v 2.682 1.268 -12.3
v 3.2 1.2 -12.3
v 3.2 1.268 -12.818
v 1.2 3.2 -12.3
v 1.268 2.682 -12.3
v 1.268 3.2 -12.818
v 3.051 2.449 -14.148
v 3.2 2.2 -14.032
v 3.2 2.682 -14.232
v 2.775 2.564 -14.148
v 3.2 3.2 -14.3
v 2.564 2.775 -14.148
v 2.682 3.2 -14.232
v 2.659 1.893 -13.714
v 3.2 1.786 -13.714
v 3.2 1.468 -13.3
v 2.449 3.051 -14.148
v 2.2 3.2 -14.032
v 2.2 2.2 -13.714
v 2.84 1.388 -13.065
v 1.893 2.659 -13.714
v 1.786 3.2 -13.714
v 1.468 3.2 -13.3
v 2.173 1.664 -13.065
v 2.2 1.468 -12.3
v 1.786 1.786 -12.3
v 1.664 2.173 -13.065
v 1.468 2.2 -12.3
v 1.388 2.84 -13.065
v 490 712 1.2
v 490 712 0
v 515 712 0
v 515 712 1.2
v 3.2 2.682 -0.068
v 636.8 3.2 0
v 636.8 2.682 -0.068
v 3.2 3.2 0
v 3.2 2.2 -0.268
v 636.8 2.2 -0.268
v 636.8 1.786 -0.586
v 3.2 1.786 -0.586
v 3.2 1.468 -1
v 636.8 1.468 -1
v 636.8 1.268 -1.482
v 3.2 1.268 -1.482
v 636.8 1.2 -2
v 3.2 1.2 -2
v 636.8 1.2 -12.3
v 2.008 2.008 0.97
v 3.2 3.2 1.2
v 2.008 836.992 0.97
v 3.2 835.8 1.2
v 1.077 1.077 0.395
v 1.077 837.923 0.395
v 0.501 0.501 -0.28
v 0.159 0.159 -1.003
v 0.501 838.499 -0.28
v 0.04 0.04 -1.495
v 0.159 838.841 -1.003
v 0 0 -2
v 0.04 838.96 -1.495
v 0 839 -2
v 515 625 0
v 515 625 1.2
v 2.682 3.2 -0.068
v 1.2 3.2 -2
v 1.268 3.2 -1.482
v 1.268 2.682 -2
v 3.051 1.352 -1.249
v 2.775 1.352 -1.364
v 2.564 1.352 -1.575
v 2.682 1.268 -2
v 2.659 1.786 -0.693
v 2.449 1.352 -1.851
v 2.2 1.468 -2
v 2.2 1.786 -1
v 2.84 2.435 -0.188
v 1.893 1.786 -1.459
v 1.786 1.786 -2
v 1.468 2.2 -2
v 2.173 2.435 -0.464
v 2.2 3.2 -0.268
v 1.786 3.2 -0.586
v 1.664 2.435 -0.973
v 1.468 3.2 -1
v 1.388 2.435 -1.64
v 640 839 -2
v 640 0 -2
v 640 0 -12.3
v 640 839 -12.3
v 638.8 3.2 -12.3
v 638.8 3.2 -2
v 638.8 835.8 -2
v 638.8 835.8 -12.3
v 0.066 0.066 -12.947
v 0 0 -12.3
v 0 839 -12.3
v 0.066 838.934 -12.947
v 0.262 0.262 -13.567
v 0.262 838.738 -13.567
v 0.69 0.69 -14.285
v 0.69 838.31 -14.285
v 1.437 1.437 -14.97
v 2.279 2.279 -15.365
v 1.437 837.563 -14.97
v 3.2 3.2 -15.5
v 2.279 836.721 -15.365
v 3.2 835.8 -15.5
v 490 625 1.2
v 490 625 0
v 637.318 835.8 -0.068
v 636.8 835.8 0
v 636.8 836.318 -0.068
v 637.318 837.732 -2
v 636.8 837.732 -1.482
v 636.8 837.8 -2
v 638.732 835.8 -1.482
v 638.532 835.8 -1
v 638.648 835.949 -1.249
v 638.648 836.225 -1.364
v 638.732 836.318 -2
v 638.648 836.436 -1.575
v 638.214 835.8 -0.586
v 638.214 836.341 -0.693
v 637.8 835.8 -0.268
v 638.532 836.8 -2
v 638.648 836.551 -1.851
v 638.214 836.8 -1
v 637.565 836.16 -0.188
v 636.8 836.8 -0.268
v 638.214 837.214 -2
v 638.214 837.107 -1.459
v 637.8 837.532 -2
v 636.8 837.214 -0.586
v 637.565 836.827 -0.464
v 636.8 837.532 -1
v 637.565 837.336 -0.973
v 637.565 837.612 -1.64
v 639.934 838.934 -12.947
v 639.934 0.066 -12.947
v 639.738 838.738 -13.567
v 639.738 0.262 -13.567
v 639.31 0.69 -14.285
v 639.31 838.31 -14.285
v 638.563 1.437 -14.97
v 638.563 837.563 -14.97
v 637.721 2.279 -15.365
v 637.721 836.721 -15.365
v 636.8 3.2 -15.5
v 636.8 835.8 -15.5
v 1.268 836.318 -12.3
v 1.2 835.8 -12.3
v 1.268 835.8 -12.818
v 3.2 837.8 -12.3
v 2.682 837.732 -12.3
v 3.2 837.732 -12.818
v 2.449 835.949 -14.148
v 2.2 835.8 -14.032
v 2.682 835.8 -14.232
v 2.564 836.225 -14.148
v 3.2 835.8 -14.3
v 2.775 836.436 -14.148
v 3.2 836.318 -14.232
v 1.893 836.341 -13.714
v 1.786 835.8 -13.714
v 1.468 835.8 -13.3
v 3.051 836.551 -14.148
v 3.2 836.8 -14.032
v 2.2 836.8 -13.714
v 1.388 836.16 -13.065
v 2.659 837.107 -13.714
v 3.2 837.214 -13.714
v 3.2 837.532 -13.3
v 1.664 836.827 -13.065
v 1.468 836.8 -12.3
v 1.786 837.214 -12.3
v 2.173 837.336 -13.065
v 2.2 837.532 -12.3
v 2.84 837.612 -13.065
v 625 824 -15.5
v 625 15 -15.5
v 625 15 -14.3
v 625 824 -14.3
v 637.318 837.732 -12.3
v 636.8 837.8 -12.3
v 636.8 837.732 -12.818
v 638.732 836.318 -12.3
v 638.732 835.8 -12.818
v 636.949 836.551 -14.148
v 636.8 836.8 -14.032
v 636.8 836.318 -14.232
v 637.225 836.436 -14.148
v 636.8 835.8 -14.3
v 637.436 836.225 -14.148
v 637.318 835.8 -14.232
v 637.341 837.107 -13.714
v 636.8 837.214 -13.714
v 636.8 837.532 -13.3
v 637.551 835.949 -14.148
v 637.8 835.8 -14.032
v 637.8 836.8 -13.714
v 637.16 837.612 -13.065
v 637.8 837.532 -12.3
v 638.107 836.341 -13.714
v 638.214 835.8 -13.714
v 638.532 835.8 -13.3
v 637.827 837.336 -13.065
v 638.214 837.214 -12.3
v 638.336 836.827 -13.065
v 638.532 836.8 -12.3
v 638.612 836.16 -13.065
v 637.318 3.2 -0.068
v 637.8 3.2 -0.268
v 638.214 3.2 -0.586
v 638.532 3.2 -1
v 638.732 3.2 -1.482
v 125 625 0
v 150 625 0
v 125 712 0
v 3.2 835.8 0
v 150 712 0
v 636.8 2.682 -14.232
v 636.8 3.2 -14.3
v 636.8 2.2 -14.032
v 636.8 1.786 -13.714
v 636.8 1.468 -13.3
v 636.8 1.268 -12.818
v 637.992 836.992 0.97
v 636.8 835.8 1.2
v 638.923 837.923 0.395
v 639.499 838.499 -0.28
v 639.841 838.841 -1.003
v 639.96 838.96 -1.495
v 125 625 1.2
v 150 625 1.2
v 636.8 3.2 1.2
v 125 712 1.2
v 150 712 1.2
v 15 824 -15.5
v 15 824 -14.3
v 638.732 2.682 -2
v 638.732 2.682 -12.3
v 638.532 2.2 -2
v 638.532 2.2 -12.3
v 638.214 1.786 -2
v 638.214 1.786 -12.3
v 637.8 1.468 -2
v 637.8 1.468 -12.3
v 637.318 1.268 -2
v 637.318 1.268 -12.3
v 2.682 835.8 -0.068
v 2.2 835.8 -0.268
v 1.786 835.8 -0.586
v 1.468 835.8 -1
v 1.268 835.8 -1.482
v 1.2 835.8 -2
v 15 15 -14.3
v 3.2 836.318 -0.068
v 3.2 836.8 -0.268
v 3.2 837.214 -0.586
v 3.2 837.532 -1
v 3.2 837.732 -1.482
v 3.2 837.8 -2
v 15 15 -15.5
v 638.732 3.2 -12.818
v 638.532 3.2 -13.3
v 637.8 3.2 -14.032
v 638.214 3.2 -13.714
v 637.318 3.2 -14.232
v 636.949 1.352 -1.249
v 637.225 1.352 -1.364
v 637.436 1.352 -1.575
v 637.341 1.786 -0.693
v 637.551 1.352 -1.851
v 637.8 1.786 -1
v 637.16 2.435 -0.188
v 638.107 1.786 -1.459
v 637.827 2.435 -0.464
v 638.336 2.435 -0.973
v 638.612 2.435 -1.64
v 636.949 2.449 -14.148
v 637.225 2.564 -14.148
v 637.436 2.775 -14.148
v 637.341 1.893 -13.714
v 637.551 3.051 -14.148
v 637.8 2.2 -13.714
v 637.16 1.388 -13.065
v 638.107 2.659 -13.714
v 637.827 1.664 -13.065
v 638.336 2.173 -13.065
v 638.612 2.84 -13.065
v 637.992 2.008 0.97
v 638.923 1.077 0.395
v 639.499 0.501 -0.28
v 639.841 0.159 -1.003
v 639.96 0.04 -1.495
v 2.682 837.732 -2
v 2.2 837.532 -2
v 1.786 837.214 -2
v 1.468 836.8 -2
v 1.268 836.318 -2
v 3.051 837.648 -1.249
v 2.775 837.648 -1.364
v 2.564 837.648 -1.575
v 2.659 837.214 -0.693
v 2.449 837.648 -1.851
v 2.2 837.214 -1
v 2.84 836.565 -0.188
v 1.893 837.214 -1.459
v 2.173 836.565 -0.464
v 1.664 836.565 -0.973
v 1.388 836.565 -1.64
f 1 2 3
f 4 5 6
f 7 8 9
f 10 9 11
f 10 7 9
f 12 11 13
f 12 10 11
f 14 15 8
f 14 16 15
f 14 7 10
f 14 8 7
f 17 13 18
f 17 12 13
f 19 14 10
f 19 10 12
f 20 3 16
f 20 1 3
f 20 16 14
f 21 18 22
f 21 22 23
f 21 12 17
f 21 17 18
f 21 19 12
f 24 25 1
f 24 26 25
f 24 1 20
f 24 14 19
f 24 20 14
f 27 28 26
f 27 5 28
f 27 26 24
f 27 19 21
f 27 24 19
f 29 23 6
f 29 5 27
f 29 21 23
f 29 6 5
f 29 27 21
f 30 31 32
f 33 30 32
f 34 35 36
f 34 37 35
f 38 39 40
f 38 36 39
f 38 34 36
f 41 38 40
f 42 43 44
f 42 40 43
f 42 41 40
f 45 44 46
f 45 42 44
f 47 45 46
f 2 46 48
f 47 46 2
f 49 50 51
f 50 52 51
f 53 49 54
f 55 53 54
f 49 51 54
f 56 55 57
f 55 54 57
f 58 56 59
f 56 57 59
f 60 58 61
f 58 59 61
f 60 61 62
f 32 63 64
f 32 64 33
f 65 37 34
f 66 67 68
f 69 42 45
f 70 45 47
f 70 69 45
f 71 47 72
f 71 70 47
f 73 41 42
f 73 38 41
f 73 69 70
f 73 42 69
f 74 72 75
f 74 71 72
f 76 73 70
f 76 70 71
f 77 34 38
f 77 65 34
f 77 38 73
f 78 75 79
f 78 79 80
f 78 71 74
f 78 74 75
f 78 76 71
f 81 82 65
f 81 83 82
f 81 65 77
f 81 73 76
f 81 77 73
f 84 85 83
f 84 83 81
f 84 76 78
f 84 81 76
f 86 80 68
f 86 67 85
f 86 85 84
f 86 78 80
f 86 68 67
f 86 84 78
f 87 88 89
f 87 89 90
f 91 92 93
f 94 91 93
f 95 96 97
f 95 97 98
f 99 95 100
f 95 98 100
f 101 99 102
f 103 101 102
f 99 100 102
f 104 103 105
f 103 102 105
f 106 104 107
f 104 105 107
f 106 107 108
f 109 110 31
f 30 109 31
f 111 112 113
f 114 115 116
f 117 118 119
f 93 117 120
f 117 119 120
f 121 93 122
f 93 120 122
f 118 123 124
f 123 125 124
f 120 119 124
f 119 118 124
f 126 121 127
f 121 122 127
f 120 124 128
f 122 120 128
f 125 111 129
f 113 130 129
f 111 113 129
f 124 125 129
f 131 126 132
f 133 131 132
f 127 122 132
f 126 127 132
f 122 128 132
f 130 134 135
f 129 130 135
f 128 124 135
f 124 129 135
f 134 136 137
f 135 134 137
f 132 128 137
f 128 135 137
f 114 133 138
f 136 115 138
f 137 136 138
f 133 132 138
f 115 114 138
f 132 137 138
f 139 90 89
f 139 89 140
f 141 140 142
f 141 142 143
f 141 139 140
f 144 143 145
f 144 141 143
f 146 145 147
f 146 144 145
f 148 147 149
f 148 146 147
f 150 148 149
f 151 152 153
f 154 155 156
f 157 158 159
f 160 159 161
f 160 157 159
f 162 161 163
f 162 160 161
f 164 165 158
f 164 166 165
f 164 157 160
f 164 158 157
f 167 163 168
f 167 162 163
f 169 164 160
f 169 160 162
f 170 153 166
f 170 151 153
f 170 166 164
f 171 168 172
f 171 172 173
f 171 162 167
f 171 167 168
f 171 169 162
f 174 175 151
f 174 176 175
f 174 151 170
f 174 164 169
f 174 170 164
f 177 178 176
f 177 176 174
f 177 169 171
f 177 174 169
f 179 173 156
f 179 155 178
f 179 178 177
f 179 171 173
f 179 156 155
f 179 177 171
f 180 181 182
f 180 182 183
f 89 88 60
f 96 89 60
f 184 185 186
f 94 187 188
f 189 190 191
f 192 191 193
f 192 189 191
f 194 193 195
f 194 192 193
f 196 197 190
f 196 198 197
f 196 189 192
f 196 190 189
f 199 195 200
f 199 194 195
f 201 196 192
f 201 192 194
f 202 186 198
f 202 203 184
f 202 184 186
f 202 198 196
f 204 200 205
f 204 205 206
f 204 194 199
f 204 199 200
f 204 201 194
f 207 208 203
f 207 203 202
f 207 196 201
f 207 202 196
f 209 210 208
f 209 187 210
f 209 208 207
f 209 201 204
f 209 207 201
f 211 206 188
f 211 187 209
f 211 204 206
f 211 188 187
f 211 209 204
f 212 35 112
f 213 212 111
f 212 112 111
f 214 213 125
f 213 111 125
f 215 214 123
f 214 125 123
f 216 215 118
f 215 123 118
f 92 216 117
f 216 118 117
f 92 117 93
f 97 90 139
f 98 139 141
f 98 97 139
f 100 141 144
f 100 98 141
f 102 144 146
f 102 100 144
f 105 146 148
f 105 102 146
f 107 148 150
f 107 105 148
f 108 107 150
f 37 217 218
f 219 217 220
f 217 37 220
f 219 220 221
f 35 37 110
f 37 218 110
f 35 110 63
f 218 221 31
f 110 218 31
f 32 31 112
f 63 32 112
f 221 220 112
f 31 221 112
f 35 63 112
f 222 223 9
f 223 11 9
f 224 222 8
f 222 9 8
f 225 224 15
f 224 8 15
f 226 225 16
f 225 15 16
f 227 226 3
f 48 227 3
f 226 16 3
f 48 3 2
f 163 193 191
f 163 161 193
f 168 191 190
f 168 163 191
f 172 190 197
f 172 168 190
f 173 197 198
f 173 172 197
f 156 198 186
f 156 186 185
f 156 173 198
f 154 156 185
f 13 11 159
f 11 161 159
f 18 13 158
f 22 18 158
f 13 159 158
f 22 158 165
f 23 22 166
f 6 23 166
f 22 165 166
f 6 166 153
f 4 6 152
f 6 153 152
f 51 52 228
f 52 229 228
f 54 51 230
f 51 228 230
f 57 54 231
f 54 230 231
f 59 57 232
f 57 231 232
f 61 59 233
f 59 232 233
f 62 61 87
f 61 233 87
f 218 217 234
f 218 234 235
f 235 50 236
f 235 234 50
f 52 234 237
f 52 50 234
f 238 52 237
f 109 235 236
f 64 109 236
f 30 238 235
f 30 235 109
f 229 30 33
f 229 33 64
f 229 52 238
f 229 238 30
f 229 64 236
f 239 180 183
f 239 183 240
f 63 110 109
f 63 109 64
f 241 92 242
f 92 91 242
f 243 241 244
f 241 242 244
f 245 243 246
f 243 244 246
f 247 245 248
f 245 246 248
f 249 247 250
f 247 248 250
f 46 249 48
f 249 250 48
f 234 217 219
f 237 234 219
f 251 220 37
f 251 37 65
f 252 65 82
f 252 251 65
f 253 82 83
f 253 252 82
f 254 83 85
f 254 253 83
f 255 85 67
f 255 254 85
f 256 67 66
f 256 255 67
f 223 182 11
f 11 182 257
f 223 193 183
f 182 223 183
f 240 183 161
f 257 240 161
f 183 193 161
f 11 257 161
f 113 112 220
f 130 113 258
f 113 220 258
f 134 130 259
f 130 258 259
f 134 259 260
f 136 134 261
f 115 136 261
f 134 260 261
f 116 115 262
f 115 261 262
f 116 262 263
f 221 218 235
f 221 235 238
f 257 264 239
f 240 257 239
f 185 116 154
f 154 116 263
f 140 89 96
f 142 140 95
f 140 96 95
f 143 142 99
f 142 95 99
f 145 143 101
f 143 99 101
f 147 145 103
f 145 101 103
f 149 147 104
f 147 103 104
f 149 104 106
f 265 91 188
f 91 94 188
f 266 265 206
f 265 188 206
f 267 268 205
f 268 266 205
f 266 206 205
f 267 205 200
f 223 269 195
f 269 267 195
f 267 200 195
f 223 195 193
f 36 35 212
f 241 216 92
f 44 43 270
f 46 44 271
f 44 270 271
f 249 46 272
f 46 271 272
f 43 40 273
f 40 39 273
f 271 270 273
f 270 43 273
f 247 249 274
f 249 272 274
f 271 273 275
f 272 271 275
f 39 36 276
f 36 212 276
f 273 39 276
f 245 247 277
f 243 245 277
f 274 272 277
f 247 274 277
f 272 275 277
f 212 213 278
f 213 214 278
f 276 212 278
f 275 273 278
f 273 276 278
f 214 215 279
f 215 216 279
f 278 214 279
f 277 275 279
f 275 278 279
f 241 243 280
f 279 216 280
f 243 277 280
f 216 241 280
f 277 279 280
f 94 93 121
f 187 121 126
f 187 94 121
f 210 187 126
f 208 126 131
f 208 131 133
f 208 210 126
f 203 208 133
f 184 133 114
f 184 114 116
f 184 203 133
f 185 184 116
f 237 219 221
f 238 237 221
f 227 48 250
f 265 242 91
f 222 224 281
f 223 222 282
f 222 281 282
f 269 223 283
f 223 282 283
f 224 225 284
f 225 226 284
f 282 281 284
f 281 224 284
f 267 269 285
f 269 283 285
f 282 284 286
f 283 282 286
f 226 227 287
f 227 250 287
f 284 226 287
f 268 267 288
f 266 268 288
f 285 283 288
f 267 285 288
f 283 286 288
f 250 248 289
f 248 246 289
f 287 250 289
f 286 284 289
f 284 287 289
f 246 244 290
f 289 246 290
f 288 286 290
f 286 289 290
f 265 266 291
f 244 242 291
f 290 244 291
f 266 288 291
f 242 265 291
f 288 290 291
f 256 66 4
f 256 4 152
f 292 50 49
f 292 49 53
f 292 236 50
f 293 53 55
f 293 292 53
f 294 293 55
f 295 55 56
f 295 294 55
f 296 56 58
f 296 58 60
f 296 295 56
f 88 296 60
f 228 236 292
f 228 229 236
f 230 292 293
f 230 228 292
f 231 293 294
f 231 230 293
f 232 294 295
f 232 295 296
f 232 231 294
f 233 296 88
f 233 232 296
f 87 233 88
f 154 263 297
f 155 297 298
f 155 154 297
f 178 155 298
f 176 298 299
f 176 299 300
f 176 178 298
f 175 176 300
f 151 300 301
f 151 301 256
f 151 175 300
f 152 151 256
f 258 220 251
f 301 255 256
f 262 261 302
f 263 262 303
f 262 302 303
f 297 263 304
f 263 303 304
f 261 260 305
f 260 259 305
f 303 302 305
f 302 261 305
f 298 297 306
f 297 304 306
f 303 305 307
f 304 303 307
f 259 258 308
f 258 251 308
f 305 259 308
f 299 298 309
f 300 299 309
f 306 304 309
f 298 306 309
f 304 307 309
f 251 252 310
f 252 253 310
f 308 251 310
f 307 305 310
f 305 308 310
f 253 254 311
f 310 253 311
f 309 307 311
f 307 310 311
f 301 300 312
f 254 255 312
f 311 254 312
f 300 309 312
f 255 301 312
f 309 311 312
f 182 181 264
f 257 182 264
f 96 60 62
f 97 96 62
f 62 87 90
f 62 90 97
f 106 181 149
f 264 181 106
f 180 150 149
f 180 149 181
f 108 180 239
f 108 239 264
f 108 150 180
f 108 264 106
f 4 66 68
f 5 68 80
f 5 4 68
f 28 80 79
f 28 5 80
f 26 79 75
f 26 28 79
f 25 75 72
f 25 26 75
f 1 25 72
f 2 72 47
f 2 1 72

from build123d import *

# Parameters (mm, degrees)
SKETCH_1_W      = 640
SKETCH_1_H      = 839
SKETCH_1_W_2    = 25
SKETCH_1_H_2    = 87
EXTRUDE_1_DEPTH = 1.2
SKETCH_2_W      = 640
SKETCH_2_H      = 839
SKETCH_2_W_2    = 637.6
SKETCH_2_H_2    = 836.6
EXTRUDE_2_DEPTH = 15.5
SKETCH_3_W      = 640
SKETCH_3_H      = 839
SKETCH_3_W_2    = 610
SKETCH_3_H_2    = 809
EXTRUDE_3_DEPTH = 1.2
FILLET_1_R      = 2
FILLET_2_R      = 3.2
FILLET_3_R      = 3.2


with BuildPart() as part:
    # 스케치1 → 보스-돌출1 (new body)
    with BuildSketch(Plane.XY):
        with Locations((320, 419.5)):
            Rectangle(SKETCH_1_W, SKETCH_1_H)
        with Locations((137.5, 668.5)):
            Rectangle(SKETCH_1_W_2, SKETCH_1_H_2, mode=Mode.SUBTRACT)
        with Locations((502.5, 668.5)):
            Rectangle(SKETCH_1_W_2, SKETCH_1_H_2, mode=Mode.SUBTRACT)
    extrude(amount=EXTRUDE_1_DEPTH)

    # 스케치2 → 보스-돌출2 (add)
    with BuildSketch(Plane(origin=(0, 0, 0), x_dir=(-1, 0, 0), z_dir=(0, 0, -1))):
        with Locations((-320, 419.5)):
            Rectangle(SKETCH_2_W, SKETCH_2_H)
        with Locations((-320, 419.5)):
            Rectangle(SKETCH_2_W_2, SKETCH_2_H_2, mode=Mode.SUBTRACT)
    extrude(amount=EXTRUDE_2_DEPTH)

    # 스케치3 → 보스-돌출3 (add)
    with BuildSketch(Plane(origin=(0, 0, -15.5), x_dir=(-1, 0, 0), z_dir=(0, 0, -1))):
        with Locations((-320, 419.5)):
            Rectangle(SKETCH_3_W, SKETCH_3_H)
        with Locations((-320, 419.5)):
            Rectangle(SKETCH_3_W_2, SKETCH_3_H_2, mode=Mode.SUBTRACT)
    extrude(amount=-EXTRUDE_3_DEPTH)

    # 필렛1
    fillet_1_edges = [part.edges().sort_by_distance(p)[0] for p in [
        (1.2, 419.5, 0),
        (320, 837.8, 0),
        (638.8, 419.5, 0),
        (320, 1.2, 0),
        (638.8, 1.2, -7.15),
        (1.2, 1.2, -7.15),
        (320, 1.2, -14.3),
        (638.8, 837.8, -7.15),
        (1.2, 837.8, -7.15),
        (1.2, 419.5, -14.3),
        (320, 837.8, -14.3),
        (638.8, 419.5, -14.3),
    ]]
    fillet(fillet_1_edges, radius=FILLET_1_R)

    # 필렛2
    fillet_2_edges = [part.edges().sort_by_distance(p)[0] for p in [
        (640, 419.5, 1.2),
        (320, 839, 1.2),
        (0, 419.5, 1.2),
        (320, 0, 1.2),
    ]]
    fillet(fillet_2_edges, radius=FILLET_2_R)

    # 필렛3
    fillet_3_edges = [part.edges().sort_by_distance(p)[0] for p in [
        (320, 0, -15.5),
        (0, 419.5, -15.5),
        (320, 839, -15.5),
        (640, 419.5, -15.5),
    ]]
    fillet(fillet_3_edges, radius=FILLET_3_R)


solid = part.part
